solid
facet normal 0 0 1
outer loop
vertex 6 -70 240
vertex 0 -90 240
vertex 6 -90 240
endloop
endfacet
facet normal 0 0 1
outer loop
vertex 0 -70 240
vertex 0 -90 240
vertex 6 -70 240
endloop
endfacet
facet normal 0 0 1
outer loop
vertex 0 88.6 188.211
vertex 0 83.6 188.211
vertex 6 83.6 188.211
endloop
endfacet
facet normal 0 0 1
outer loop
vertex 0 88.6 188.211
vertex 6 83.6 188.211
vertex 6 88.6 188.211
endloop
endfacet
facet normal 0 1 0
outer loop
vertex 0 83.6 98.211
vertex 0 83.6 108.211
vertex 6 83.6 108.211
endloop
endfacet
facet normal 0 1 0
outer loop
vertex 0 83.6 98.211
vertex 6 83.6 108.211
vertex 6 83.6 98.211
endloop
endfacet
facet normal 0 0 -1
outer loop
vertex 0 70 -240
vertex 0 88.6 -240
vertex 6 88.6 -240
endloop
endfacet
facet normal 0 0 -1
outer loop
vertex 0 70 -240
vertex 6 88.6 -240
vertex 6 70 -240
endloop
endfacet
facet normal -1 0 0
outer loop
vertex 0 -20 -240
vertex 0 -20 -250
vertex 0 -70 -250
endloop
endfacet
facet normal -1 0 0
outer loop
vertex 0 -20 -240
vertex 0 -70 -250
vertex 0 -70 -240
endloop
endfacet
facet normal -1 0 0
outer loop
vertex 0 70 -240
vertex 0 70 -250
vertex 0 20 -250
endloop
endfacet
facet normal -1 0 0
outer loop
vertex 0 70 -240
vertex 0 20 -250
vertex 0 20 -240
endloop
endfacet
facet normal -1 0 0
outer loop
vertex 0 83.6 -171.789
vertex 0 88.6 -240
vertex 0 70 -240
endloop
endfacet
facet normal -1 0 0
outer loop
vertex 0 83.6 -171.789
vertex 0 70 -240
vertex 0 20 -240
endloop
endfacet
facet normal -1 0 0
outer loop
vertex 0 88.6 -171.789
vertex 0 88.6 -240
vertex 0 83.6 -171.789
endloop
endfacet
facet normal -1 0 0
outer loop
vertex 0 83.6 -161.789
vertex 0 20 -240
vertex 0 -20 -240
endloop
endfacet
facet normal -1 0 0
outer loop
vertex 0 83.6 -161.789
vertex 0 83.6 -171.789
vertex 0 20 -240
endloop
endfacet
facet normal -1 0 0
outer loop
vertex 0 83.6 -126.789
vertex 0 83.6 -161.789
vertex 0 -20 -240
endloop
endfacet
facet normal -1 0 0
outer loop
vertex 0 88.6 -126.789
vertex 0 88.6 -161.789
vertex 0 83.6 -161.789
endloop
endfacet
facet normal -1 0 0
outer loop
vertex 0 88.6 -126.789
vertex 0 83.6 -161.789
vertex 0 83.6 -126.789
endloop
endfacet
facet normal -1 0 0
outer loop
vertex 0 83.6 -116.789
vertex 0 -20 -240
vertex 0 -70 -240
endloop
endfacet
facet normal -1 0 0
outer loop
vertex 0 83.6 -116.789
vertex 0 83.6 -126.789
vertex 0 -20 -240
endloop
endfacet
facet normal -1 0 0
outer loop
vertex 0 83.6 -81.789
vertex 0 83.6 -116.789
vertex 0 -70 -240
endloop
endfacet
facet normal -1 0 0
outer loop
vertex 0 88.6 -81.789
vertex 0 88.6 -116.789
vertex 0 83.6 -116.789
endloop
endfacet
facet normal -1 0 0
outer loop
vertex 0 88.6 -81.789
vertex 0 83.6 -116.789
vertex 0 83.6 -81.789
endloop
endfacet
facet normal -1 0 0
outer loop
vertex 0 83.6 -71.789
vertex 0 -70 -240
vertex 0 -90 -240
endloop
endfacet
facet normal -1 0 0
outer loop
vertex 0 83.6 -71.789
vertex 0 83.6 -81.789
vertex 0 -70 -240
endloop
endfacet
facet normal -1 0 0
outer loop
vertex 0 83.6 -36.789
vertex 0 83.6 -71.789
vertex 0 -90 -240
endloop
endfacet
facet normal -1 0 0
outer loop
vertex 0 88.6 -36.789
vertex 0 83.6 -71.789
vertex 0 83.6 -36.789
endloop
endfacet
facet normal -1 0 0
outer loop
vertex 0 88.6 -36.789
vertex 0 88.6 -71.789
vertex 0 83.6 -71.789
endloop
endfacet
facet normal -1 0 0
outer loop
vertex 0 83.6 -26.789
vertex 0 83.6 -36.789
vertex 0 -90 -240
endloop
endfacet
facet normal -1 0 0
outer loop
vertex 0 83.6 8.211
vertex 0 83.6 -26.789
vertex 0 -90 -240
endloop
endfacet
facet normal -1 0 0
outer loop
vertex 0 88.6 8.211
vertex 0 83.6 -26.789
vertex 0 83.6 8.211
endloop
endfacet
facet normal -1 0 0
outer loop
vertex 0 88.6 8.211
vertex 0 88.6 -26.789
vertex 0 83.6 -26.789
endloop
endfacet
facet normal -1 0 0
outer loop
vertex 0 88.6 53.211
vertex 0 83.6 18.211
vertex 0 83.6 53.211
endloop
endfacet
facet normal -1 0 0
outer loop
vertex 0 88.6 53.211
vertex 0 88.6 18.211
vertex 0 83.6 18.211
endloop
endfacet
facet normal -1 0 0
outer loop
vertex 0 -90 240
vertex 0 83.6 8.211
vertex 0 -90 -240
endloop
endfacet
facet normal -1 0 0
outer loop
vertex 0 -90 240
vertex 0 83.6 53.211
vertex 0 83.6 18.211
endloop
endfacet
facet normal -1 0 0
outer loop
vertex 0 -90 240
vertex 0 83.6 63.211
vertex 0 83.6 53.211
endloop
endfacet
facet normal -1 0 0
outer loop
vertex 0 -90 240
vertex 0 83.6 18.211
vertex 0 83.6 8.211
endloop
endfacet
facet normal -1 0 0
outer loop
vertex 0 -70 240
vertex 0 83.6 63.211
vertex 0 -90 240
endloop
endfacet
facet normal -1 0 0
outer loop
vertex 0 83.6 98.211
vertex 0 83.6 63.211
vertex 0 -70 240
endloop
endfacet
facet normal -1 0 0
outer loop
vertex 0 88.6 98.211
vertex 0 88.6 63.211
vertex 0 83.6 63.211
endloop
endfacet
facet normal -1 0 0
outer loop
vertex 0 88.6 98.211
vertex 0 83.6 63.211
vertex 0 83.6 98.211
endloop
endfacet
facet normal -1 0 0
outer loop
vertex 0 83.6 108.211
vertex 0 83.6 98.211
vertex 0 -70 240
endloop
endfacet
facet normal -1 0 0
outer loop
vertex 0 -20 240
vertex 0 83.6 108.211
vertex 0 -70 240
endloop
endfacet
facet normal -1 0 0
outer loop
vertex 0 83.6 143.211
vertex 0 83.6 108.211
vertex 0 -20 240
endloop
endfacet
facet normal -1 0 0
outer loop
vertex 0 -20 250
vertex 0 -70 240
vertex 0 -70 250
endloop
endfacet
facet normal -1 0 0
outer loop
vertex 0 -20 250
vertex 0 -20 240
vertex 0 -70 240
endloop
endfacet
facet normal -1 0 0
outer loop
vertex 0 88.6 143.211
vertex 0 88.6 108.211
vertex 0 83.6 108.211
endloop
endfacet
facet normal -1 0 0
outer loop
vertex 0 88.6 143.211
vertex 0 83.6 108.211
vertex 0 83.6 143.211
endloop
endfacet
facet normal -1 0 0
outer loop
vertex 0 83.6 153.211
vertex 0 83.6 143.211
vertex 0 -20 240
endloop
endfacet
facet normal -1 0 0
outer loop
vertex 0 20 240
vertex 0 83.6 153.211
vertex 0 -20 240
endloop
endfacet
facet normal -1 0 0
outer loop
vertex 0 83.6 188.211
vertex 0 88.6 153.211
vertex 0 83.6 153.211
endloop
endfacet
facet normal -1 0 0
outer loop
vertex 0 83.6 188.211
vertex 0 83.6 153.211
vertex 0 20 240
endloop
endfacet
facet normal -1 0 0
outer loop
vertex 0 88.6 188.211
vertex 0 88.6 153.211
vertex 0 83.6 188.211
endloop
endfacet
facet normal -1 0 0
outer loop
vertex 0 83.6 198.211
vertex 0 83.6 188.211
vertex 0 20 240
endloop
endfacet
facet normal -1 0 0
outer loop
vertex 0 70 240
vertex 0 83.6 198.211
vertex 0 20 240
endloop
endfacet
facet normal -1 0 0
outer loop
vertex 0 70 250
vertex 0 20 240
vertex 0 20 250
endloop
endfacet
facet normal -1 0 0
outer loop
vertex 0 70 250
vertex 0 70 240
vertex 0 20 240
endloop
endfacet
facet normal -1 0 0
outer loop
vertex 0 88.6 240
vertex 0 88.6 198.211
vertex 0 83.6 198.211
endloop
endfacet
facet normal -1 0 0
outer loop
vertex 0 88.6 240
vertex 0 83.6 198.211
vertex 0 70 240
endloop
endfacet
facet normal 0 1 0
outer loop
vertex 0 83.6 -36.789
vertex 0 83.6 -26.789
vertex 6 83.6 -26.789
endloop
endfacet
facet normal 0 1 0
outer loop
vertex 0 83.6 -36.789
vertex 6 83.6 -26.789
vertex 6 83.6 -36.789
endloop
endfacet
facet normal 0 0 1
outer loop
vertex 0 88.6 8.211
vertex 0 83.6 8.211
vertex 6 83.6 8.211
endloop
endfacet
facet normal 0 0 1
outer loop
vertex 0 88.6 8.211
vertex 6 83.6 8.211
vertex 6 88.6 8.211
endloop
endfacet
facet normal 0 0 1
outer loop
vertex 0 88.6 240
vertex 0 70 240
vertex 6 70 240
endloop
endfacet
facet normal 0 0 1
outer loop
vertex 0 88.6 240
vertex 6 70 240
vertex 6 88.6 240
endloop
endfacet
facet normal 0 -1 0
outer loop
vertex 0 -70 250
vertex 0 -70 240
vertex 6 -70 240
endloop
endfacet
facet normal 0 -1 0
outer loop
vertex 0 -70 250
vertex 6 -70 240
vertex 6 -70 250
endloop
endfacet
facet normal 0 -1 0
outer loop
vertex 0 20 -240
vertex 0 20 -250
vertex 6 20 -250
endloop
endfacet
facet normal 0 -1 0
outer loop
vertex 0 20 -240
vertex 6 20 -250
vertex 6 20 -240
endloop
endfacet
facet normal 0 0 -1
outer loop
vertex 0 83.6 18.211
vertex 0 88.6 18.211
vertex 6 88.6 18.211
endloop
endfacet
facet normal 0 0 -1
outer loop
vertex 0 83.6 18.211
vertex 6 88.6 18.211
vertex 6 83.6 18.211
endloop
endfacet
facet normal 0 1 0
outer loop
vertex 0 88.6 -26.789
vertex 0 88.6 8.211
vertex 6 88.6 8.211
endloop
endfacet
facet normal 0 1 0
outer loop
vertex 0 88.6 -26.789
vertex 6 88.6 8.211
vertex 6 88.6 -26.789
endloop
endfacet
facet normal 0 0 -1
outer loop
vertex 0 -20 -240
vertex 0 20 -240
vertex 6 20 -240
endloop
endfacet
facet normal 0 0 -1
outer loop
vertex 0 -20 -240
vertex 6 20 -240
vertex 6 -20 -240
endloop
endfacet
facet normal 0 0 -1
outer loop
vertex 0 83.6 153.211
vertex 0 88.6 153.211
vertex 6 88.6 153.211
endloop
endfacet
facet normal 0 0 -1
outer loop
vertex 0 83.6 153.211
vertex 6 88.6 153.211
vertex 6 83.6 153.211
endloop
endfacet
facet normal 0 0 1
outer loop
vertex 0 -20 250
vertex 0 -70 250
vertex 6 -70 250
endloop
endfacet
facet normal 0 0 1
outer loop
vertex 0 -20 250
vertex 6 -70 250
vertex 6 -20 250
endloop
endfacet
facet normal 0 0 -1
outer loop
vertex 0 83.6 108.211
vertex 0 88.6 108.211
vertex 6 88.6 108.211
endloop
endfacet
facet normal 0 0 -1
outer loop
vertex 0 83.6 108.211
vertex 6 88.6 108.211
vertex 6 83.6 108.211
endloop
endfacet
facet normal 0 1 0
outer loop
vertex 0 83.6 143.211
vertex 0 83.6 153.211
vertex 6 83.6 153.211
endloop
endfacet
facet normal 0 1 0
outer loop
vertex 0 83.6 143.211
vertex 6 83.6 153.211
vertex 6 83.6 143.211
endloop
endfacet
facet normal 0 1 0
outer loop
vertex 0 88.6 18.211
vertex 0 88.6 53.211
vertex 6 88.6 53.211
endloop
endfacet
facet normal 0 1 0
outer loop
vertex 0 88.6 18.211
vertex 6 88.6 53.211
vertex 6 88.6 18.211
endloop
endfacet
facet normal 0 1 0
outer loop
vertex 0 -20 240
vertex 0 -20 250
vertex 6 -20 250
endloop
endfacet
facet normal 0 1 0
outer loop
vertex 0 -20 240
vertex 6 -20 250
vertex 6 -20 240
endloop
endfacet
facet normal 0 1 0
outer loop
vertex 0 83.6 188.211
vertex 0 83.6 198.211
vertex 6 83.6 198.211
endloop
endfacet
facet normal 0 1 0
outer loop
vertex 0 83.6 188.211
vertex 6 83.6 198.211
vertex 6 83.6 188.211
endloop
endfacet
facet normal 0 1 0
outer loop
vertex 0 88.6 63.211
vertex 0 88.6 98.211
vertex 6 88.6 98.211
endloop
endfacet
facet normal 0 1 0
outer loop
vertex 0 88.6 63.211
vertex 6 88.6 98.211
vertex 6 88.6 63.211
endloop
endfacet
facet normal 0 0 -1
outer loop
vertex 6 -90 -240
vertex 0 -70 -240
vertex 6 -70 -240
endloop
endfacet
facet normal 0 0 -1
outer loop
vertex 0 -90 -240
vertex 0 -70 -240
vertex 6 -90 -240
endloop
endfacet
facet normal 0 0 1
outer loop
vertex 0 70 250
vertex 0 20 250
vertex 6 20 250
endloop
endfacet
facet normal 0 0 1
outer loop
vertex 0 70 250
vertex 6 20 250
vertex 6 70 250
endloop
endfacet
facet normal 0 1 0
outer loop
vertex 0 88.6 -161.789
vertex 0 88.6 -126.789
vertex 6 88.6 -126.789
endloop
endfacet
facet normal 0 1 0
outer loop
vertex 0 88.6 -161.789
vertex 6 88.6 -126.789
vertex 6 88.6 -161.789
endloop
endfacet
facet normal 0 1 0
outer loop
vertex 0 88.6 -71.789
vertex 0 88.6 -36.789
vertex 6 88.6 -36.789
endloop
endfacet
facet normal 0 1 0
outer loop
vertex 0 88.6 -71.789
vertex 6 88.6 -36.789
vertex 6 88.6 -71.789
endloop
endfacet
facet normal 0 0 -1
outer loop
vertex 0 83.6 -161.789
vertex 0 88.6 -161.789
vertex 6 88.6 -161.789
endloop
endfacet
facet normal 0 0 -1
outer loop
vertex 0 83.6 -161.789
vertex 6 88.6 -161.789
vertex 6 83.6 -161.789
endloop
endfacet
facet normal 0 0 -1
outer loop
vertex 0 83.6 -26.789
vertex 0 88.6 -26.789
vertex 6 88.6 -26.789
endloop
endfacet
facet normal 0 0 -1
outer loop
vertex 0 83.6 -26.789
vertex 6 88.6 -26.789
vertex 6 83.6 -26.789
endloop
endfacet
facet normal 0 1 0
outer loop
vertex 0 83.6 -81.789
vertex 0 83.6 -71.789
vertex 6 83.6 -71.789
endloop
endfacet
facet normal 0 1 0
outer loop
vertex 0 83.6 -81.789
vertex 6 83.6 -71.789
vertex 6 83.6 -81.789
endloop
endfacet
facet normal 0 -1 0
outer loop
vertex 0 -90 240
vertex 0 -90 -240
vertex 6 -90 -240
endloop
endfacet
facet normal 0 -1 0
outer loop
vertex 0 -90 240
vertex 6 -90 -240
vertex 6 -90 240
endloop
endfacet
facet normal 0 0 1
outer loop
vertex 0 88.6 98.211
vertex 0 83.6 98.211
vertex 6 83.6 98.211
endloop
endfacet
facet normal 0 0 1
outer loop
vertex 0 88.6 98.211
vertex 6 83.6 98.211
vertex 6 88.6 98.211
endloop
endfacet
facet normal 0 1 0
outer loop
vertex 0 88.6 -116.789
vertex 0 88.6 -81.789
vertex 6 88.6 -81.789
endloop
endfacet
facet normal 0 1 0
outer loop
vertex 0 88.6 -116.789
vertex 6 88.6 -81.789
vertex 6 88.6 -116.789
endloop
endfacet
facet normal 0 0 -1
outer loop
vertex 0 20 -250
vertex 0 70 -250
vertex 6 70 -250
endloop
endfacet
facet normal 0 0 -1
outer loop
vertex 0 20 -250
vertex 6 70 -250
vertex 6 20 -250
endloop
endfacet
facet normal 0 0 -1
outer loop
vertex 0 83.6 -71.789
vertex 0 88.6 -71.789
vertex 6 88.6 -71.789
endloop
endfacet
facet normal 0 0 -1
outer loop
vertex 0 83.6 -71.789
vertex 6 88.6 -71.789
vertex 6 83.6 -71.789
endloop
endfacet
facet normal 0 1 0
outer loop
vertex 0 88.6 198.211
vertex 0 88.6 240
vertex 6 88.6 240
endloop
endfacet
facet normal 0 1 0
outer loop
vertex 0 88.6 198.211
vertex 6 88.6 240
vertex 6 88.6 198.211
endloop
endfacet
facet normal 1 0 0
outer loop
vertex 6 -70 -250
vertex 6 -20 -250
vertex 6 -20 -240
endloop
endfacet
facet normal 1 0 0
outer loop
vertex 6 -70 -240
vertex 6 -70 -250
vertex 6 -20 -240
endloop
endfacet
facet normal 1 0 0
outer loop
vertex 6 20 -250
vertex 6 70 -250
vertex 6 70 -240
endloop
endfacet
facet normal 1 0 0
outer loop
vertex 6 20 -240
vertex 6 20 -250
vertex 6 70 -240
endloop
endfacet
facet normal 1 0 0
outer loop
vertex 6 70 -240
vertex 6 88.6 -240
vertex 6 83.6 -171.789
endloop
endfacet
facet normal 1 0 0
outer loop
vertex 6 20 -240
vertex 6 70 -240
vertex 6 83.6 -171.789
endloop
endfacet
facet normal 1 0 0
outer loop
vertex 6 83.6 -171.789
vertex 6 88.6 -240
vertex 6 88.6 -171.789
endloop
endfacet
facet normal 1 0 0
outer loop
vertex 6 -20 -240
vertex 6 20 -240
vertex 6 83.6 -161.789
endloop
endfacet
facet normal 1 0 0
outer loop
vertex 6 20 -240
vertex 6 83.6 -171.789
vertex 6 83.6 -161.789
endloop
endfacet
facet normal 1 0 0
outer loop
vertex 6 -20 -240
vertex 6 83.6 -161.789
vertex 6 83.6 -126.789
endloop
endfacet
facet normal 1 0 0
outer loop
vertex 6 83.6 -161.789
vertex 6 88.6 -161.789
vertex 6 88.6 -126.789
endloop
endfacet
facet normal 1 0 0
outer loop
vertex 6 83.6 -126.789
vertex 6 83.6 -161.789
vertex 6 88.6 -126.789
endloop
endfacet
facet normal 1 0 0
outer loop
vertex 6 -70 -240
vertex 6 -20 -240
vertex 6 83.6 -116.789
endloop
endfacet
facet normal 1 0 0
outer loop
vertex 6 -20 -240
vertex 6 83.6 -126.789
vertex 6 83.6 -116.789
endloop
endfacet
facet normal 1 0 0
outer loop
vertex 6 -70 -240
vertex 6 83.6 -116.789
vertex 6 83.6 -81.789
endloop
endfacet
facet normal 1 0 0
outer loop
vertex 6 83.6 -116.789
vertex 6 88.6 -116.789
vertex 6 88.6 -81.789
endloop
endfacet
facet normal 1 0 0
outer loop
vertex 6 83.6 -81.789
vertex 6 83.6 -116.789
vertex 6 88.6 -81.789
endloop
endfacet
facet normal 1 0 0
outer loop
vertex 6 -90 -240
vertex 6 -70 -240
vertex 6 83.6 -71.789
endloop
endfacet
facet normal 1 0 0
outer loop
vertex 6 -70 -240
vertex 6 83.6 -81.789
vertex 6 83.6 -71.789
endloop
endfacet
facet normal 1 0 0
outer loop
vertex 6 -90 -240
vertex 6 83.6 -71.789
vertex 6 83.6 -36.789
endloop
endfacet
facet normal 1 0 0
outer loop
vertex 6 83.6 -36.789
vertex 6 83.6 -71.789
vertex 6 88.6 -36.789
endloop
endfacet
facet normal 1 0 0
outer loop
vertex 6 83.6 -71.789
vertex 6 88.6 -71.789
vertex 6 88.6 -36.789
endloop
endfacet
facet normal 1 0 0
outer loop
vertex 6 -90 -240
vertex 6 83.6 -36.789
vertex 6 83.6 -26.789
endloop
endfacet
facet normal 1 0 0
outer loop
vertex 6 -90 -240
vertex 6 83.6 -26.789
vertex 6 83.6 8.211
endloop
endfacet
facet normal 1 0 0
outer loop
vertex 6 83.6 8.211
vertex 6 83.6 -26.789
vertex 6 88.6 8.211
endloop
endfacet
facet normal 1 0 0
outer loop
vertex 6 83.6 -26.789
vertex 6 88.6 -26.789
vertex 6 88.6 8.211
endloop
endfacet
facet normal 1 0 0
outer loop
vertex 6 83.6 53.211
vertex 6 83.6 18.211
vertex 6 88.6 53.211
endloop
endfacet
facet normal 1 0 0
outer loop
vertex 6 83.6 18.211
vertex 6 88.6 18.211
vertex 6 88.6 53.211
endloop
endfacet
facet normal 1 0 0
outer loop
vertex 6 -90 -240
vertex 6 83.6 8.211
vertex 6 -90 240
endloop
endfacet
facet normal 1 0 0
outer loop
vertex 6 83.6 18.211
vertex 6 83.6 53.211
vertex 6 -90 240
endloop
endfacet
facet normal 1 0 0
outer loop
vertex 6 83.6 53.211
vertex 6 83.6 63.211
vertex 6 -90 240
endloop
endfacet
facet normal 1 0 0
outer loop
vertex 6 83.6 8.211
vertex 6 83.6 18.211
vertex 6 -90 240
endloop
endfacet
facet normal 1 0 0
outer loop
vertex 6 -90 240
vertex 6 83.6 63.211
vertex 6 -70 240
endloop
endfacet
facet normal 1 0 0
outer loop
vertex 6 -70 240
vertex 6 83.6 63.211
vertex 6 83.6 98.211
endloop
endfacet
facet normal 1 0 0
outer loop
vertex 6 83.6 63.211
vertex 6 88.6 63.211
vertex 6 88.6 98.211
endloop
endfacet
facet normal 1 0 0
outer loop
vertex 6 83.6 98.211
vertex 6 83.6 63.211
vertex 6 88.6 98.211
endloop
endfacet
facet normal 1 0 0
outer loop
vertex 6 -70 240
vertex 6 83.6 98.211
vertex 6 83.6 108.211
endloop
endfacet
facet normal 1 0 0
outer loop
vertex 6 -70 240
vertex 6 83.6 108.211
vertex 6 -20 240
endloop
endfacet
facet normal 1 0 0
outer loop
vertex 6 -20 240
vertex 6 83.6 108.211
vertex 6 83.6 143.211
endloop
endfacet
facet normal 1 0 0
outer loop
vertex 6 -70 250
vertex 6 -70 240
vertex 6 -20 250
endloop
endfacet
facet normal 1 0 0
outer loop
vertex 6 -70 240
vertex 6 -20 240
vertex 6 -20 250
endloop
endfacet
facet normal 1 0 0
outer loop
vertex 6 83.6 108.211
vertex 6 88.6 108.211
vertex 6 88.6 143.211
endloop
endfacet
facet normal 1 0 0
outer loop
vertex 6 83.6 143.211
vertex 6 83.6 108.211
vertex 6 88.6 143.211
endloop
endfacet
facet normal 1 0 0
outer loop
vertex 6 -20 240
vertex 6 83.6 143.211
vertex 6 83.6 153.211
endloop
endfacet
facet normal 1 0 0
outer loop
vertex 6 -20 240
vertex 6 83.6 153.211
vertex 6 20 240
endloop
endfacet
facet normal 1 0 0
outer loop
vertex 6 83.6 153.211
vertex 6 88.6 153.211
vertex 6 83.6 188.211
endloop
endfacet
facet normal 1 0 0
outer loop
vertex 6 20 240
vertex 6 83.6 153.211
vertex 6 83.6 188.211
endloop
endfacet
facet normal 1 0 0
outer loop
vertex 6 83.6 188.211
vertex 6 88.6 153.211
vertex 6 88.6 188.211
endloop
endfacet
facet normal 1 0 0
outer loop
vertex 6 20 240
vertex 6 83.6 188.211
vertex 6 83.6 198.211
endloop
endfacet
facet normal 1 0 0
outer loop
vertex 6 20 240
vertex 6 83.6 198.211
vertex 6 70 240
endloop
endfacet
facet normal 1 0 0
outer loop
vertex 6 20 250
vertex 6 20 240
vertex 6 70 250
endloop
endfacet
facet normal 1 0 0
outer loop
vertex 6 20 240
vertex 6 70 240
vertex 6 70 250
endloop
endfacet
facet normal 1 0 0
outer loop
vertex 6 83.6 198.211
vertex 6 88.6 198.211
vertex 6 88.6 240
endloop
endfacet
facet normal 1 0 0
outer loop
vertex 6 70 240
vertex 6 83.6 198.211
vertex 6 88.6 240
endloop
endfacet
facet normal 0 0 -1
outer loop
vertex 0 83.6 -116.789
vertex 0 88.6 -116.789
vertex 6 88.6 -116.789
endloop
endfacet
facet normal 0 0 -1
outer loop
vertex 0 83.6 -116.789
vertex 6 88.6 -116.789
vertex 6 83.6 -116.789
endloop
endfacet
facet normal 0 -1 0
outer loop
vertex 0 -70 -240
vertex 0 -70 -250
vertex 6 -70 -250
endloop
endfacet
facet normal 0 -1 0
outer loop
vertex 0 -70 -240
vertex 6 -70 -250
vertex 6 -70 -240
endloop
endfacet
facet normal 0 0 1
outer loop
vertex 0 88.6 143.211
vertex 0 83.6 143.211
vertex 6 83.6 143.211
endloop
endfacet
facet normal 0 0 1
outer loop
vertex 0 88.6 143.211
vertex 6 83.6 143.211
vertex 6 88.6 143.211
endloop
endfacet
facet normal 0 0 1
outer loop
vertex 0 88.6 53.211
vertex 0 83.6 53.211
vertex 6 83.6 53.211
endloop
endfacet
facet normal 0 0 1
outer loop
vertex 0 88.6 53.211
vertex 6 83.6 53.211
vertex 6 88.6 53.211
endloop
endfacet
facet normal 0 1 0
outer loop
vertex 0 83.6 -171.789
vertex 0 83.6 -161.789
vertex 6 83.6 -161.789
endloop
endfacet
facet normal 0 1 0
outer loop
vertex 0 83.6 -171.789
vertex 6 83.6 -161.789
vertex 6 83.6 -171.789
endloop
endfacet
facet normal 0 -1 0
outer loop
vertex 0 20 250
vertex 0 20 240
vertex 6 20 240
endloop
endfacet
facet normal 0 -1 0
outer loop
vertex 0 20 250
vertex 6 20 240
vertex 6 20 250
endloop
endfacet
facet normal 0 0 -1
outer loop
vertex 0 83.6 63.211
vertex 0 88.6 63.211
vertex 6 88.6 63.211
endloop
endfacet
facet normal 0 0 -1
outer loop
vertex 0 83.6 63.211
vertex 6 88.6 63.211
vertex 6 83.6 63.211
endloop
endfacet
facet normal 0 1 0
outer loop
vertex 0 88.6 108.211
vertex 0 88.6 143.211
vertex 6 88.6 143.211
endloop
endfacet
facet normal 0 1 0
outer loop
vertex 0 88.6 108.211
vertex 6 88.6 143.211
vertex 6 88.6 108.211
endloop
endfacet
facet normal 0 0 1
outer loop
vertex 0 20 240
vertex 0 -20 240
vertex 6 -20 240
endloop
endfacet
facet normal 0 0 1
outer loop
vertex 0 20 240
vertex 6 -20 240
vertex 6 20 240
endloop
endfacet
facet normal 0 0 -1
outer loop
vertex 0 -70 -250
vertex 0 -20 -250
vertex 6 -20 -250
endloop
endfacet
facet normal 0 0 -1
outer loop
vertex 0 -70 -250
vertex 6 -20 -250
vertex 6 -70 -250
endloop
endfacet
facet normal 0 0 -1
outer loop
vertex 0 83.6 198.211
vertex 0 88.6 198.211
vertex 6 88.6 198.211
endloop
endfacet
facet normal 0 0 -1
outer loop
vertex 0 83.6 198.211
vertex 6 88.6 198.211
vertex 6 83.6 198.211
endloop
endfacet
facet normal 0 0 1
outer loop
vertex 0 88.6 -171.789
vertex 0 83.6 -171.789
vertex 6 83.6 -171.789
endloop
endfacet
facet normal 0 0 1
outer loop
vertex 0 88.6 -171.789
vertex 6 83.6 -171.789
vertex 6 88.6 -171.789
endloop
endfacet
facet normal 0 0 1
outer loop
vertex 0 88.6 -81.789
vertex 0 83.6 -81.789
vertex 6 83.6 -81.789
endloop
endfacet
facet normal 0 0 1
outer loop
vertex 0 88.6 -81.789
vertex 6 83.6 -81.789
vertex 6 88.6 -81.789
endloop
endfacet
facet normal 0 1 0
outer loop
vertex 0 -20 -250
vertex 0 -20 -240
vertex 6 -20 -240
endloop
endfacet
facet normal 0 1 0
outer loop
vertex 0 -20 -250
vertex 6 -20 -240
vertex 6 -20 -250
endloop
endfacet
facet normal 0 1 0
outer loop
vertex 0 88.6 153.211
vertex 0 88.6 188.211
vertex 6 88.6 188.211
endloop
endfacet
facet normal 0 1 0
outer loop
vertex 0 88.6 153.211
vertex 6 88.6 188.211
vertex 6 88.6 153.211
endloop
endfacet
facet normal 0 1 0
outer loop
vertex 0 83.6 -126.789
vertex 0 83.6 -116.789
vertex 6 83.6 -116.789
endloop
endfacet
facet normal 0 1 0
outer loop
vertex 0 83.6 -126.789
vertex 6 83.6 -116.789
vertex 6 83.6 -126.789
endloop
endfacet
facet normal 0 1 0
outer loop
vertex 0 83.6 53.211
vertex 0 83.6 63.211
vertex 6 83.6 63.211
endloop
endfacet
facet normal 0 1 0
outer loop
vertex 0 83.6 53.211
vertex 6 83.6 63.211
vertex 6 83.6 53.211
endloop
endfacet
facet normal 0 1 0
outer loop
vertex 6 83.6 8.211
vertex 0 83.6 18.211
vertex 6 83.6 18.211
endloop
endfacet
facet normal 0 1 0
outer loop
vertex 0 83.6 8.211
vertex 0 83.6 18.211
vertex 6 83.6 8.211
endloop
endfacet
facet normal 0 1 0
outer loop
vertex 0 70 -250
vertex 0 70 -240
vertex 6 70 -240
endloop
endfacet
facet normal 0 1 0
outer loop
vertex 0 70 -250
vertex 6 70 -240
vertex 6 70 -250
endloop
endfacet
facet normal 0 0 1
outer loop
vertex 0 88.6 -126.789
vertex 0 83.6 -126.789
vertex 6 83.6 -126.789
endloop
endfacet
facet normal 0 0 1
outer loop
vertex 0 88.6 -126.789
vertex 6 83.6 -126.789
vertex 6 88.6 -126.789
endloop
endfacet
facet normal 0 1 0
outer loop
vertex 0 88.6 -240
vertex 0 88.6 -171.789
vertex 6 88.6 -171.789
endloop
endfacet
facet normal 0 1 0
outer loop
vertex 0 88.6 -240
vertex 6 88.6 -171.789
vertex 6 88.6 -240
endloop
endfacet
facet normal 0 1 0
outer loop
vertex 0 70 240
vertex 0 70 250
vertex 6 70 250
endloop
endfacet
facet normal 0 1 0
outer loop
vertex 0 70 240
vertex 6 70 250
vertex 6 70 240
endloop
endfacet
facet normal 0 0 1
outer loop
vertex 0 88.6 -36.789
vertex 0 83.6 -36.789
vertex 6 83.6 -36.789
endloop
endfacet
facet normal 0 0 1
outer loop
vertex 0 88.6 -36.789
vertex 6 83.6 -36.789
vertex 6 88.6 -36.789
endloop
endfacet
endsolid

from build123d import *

# Parameters (mm, degrees)
EXTRUDE_2_DEPTH = 6


with BuildPart() as part:
    # Эскиз1 → Бобышка-Вытянуть2 (new body)
    with BuildSketch(Plane(origin=(0, 0, 0), x_dir=(0, 0, -1), z_dir=(1, 0, 0))):
        Polygon((240, -90), (-240, -90), (-240, -70), (-250, -70), (-250, -20), (-240, -20), (-240, 20), (-250, 20), (-250, 70), (-240, 70), (-240, 88.6), (-198.210576245, 88.6), (-198.210576245, 83.6), (-188.210576245, 83.6), (-188.210576245, 88.6), (-153.210576245, 88.6), (-153.210576245, 83.6), (-143.210576245, 83.6), (-143.210576245, 88.6), (-108.210576245, 88.6), (-108.210576245, 83.6), (-98.210576245, 83.6), (-98.210576245, 88.6), (-63.210576245, 88.6), (-63.210576245, 83.6), (-53.210576245, 83.6), (-53.210576245, 88.6), (-18.210576245, 88.6), (-18.210576245, 83.6), (-8.210576245, 83.6), (-8.210576245, 88.6), (26.789423755, 88.6), (26.789423755, 83.6), (36.789423755, 83.6), (36.789423755, 88.6), (71.789423755, 88.6), (71.789423755, 83.6), (81.789423755, 83.6), (81.789423755, 88.6), (116.789423755, 88.6), (116.789423755, 83.6), (126.789423755, 83.6), (126.789423755, 88.6), (161.789423755, 88.6), (161.789423755, 83.6), (171.789423755, 83.6), (171.789423755, 88.6), (240, 88.6), (240, 70), (250, 70), (250, 20), (240, 20), (240, -20), (250, -20), (250, -70), (240, -70), align=None)
    extrude(amount=EXTRUDE_2_DEPTH)


solid = part.part
